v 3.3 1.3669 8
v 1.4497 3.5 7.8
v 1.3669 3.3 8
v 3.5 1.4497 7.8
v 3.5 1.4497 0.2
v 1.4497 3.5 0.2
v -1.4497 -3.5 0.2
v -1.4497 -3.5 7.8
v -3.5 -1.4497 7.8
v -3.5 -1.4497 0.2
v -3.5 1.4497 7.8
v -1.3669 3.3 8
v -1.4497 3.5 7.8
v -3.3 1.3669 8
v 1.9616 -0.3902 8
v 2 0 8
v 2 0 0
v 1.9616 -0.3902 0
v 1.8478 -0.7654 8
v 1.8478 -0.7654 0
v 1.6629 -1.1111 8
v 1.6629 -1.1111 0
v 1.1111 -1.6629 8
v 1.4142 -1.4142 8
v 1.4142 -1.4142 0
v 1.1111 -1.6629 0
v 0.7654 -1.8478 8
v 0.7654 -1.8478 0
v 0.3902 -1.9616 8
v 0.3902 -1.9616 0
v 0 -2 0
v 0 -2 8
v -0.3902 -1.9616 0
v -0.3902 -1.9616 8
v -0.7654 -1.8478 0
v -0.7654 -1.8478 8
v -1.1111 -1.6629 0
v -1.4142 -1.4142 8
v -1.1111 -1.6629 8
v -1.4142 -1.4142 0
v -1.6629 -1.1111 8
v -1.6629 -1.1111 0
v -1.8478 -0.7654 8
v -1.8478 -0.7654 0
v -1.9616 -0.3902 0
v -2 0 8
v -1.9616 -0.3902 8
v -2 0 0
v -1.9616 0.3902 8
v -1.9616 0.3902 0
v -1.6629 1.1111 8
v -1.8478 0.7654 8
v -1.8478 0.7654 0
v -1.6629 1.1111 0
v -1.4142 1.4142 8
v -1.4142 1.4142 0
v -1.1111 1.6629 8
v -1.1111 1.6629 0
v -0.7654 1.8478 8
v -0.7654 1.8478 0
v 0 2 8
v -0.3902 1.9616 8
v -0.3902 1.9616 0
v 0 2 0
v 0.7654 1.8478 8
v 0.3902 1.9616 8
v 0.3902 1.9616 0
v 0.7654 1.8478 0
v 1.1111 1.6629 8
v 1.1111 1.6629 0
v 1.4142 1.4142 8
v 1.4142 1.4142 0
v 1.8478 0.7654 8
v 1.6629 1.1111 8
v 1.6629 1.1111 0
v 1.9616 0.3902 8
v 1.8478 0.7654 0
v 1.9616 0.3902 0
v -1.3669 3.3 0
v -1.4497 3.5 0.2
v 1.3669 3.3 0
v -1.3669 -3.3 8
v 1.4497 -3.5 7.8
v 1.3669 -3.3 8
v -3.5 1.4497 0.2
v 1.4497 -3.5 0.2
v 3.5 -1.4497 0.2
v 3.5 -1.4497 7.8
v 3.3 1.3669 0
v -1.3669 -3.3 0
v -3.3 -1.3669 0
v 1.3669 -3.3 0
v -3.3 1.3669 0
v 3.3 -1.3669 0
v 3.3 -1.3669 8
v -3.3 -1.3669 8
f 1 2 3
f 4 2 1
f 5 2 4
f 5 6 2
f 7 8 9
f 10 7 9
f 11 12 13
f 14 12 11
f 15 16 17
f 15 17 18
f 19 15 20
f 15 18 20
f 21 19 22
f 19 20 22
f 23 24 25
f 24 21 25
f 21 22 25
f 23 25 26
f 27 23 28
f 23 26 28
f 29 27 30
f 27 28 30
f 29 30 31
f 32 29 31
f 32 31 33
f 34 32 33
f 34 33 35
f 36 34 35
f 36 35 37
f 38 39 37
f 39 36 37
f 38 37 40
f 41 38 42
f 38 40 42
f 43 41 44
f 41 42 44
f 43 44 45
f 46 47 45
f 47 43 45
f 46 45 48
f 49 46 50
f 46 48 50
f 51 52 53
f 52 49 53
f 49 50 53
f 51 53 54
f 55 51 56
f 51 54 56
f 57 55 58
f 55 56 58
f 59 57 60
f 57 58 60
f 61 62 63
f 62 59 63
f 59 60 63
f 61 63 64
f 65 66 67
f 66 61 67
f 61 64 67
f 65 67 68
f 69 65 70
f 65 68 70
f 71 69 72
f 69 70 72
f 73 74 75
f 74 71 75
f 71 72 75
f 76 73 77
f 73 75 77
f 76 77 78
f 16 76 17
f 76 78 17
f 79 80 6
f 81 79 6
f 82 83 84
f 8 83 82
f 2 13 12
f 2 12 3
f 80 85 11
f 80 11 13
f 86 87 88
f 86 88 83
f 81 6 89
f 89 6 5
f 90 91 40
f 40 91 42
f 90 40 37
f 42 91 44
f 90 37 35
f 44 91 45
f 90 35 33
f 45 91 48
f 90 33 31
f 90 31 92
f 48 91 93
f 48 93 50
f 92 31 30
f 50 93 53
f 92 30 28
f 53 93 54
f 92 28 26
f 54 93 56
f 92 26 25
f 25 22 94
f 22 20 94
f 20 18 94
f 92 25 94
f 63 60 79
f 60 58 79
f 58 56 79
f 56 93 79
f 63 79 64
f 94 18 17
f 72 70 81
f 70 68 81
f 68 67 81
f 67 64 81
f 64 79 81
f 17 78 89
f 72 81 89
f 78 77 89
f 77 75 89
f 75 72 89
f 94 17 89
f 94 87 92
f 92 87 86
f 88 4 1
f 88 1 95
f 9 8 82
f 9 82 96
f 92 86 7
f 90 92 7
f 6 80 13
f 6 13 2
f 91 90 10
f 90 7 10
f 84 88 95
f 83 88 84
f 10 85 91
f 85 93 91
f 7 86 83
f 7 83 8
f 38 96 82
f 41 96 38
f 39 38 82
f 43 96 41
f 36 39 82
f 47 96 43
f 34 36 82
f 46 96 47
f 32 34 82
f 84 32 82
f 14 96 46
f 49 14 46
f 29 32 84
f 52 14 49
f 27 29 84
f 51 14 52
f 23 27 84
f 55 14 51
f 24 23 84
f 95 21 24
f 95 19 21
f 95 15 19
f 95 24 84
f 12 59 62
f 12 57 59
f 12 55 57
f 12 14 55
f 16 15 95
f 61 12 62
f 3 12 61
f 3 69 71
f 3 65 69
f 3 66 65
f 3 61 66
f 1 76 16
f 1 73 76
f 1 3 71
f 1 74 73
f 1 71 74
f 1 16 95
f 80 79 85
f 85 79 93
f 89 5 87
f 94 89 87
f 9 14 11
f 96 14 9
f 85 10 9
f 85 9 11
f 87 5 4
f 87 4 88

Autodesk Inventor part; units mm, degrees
ref_plane "YZ Plane" through (0, 0, 0) normal (1, 0, 0) x (0, 1, 0)
ref_plane "XZ Plane" through (0, 0, 0) normal (0, 1, 0) x (-1, 0, 0)
ref_plane "XY Plane" through (0, 0, 0) normal (0, 0, 1) x (1, 0, 0)
sketch "スケッチ1" plane through (0, 0, 0) normal (0, 0, 1) x (1, 0, 0)
  circle A0 centre (0, 0) radius 2
  arc A1 (-3.5, 0) -> (-2.4749, -2.4749) centre (0, 0) ccw
  line L0 (-3.5, 3.5) -> (3.5, 3.5)
  line L1 (3.5, 3.5) -> (3.5, -3.5)
  line L2 (3.5, -3.5) -> (-3.5, -3.5)
  line L3 (-3.5, -3.5) -> (-3.5, 3.5)
  line L4 (-4.9497, 0) -> (0, 4.9497)
  line L5 (0, -4.9497) -> (-4.9497, 0)
  line L6 (4.9497, 0) -> (0, -4.9497)
  line L7 (0, 4.9497) -> (4.9497, 0)
  line L8 (-3.5, 1.4497) -> (-1.4497, 3.5)
  line L9 (1.4497, 3.5) -> (3.5, 1.4497)
  line L10 (3.5, -1.4497) -> (1.4497, -3.5)
  line L11 (-1.4497, -3.5) -> (-3.5, -1.4497)
  point P0 (-3.5, -1.4497)
  dimension "d0" = 4
  dimension "d1" = 7
  dimension "d2" = 7
  dimension "d3" = 7
  dimension "d6" = 45
extrude "押し出し1" add sketch "スケッチ1" along normal blind 8 contours L3 L4 L0 L7 L1 L6 L2 L5 A1 | A1 L5 L3
chamfer "面取り1" distance 0.2 angle 45 8 edges at (-2.4749, 2.4749, 8) (0, 3.5, 8) (3.5, 0, 8) (0, -3.5, 8) (-2.4749, -2.4749, 8) (-3.5, 0, 8) (2.4749, 2.4749, 8) (2.4749, -2.4749, 8)
chamfer "面取り2" distance 0.2 angle 45 8 edges at (2.4749, 2.4749, 0) (3.5, 0, 0) (2.4749, -2.4749, 0) (0, 3.5, 0) (-2.4749, 2.4749, 0) (-3.5, 0, 0) (-2.4749, -2.4749, 0) (0, -3.5, 0)
properties part number "GearHub6kakku" material "アルミニウム 6061"
